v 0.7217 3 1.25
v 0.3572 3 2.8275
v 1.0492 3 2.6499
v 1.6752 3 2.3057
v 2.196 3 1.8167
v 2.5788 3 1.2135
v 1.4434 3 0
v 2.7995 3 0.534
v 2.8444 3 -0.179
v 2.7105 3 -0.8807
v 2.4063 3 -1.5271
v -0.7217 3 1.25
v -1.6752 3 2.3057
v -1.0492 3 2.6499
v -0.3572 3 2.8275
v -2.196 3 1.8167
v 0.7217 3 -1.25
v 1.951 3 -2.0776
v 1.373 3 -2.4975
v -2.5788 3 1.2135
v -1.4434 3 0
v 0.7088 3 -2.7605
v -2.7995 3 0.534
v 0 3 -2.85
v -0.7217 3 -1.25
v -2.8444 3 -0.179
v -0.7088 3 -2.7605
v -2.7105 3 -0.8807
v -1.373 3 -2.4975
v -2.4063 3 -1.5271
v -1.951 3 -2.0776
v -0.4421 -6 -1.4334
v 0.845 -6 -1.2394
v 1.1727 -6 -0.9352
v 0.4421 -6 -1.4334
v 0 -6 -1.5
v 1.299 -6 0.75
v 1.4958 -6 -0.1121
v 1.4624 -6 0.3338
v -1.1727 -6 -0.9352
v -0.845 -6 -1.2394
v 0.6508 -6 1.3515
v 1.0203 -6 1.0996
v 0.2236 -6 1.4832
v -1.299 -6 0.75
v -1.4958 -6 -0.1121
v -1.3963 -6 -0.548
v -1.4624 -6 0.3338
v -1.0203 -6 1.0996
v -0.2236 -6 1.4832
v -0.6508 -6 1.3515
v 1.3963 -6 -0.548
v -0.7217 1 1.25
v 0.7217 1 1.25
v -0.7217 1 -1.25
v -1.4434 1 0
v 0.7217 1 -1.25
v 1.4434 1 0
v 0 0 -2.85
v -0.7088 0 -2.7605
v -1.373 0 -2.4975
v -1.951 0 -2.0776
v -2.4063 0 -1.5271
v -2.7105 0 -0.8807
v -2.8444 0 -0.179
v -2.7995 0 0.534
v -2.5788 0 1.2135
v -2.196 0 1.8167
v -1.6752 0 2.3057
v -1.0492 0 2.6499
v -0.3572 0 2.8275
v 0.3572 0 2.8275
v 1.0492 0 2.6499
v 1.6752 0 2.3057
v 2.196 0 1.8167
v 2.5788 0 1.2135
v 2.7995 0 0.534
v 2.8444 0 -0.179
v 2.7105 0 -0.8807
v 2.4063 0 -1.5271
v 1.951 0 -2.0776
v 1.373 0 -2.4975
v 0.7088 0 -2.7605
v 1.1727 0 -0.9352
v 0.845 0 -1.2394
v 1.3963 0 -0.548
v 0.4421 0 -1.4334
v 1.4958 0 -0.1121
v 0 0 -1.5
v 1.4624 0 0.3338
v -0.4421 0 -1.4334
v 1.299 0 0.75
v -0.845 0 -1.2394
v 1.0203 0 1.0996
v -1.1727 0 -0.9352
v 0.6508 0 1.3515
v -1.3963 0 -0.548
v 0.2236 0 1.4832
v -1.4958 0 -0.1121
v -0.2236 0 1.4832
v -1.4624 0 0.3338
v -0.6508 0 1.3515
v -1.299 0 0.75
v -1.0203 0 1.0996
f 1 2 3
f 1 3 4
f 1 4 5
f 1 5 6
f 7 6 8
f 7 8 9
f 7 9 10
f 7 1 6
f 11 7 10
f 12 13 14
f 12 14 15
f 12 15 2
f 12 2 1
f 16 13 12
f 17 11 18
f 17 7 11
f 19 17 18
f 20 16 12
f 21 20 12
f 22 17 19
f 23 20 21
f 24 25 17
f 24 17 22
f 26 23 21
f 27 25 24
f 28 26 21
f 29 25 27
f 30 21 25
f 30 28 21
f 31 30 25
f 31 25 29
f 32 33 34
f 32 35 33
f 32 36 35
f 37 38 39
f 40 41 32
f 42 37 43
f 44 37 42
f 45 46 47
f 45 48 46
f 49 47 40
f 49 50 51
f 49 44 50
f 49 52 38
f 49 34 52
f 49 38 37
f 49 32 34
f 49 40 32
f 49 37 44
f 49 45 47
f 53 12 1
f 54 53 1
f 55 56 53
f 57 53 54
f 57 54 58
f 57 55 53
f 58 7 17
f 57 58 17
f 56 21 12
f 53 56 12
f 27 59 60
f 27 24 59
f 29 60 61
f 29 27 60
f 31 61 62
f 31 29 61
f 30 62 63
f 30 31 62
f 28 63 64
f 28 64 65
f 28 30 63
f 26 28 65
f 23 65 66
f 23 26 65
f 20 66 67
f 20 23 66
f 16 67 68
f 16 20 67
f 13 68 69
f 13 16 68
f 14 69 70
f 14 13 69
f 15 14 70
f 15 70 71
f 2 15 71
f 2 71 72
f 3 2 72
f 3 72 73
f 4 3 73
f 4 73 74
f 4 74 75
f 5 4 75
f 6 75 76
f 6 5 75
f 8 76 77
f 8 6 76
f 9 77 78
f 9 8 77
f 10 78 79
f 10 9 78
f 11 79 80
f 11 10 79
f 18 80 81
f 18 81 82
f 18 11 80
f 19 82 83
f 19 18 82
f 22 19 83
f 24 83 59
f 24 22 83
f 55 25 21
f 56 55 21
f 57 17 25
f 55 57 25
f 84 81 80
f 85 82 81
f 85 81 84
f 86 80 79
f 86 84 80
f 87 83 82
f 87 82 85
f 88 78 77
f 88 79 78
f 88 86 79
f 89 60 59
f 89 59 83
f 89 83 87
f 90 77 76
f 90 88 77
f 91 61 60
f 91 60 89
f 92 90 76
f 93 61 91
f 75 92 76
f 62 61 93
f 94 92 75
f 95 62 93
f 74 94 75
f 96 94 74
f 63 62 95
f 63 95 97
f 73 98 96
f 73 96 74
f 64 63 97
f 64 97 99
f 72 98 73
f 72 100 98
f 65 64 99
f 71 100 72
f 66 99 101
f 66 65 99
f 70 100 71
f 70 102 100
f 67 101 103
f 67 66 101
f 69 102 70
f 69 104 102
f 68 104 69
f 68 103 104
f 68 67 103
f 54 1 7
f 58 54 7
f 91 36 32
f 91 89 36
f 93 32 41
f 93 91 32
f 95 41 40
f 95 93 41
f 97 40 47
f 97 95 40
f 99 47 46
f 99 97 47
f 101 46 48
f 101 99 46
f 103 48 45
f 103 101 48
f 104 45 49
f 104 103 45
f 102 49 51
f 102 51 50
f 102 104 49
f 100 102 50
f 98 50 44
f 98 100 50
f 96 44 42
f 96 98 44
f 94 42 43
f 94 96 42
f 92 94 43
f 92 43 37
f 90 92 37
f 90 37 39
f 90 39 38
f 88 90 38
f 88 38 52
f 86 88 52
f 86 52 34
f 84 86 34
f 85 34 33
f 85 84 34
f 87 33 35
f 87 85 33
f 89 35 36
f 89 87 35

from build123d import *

# Parameters (mm, degrees)
CUT_EXTRUDE1_DEPTH = 2


with BuildPart() as part:
    # Sketch1 → Revolve1 (revolve)
    with BuildSketch(Plane(origin=(0, 0, 0), x_dir=(0, 0, -1), z_dir=(1, 0, 0))):
        Polygon((0, -6), (1.5, -6), (1.5, 0), (2.85, 0), (2.85, 3), (0, 3), align=None)
    revolve(axis=Axis((0, 4, 0), (0, 1, 0)))

    # Sketch3 → Cut-Extrude1 (cut)
    with BuildSketch(Plane(origin=(0, 3, 0), x_dir=(1, 0, 0), z_dir=(0, 1, 0))):
        Polygon((1.443375673, 0), (0.721687836, 1.25), (-0.721687836, 1.25), (-1.443375673, 0), (-0.721687836, -1.25), (0.721687836, -1.25), align=None)
    extrude(amount=-CUT_EXTRUDE1_DEPTH, mode=Mode.SUBTRACT)


solid = part.part
